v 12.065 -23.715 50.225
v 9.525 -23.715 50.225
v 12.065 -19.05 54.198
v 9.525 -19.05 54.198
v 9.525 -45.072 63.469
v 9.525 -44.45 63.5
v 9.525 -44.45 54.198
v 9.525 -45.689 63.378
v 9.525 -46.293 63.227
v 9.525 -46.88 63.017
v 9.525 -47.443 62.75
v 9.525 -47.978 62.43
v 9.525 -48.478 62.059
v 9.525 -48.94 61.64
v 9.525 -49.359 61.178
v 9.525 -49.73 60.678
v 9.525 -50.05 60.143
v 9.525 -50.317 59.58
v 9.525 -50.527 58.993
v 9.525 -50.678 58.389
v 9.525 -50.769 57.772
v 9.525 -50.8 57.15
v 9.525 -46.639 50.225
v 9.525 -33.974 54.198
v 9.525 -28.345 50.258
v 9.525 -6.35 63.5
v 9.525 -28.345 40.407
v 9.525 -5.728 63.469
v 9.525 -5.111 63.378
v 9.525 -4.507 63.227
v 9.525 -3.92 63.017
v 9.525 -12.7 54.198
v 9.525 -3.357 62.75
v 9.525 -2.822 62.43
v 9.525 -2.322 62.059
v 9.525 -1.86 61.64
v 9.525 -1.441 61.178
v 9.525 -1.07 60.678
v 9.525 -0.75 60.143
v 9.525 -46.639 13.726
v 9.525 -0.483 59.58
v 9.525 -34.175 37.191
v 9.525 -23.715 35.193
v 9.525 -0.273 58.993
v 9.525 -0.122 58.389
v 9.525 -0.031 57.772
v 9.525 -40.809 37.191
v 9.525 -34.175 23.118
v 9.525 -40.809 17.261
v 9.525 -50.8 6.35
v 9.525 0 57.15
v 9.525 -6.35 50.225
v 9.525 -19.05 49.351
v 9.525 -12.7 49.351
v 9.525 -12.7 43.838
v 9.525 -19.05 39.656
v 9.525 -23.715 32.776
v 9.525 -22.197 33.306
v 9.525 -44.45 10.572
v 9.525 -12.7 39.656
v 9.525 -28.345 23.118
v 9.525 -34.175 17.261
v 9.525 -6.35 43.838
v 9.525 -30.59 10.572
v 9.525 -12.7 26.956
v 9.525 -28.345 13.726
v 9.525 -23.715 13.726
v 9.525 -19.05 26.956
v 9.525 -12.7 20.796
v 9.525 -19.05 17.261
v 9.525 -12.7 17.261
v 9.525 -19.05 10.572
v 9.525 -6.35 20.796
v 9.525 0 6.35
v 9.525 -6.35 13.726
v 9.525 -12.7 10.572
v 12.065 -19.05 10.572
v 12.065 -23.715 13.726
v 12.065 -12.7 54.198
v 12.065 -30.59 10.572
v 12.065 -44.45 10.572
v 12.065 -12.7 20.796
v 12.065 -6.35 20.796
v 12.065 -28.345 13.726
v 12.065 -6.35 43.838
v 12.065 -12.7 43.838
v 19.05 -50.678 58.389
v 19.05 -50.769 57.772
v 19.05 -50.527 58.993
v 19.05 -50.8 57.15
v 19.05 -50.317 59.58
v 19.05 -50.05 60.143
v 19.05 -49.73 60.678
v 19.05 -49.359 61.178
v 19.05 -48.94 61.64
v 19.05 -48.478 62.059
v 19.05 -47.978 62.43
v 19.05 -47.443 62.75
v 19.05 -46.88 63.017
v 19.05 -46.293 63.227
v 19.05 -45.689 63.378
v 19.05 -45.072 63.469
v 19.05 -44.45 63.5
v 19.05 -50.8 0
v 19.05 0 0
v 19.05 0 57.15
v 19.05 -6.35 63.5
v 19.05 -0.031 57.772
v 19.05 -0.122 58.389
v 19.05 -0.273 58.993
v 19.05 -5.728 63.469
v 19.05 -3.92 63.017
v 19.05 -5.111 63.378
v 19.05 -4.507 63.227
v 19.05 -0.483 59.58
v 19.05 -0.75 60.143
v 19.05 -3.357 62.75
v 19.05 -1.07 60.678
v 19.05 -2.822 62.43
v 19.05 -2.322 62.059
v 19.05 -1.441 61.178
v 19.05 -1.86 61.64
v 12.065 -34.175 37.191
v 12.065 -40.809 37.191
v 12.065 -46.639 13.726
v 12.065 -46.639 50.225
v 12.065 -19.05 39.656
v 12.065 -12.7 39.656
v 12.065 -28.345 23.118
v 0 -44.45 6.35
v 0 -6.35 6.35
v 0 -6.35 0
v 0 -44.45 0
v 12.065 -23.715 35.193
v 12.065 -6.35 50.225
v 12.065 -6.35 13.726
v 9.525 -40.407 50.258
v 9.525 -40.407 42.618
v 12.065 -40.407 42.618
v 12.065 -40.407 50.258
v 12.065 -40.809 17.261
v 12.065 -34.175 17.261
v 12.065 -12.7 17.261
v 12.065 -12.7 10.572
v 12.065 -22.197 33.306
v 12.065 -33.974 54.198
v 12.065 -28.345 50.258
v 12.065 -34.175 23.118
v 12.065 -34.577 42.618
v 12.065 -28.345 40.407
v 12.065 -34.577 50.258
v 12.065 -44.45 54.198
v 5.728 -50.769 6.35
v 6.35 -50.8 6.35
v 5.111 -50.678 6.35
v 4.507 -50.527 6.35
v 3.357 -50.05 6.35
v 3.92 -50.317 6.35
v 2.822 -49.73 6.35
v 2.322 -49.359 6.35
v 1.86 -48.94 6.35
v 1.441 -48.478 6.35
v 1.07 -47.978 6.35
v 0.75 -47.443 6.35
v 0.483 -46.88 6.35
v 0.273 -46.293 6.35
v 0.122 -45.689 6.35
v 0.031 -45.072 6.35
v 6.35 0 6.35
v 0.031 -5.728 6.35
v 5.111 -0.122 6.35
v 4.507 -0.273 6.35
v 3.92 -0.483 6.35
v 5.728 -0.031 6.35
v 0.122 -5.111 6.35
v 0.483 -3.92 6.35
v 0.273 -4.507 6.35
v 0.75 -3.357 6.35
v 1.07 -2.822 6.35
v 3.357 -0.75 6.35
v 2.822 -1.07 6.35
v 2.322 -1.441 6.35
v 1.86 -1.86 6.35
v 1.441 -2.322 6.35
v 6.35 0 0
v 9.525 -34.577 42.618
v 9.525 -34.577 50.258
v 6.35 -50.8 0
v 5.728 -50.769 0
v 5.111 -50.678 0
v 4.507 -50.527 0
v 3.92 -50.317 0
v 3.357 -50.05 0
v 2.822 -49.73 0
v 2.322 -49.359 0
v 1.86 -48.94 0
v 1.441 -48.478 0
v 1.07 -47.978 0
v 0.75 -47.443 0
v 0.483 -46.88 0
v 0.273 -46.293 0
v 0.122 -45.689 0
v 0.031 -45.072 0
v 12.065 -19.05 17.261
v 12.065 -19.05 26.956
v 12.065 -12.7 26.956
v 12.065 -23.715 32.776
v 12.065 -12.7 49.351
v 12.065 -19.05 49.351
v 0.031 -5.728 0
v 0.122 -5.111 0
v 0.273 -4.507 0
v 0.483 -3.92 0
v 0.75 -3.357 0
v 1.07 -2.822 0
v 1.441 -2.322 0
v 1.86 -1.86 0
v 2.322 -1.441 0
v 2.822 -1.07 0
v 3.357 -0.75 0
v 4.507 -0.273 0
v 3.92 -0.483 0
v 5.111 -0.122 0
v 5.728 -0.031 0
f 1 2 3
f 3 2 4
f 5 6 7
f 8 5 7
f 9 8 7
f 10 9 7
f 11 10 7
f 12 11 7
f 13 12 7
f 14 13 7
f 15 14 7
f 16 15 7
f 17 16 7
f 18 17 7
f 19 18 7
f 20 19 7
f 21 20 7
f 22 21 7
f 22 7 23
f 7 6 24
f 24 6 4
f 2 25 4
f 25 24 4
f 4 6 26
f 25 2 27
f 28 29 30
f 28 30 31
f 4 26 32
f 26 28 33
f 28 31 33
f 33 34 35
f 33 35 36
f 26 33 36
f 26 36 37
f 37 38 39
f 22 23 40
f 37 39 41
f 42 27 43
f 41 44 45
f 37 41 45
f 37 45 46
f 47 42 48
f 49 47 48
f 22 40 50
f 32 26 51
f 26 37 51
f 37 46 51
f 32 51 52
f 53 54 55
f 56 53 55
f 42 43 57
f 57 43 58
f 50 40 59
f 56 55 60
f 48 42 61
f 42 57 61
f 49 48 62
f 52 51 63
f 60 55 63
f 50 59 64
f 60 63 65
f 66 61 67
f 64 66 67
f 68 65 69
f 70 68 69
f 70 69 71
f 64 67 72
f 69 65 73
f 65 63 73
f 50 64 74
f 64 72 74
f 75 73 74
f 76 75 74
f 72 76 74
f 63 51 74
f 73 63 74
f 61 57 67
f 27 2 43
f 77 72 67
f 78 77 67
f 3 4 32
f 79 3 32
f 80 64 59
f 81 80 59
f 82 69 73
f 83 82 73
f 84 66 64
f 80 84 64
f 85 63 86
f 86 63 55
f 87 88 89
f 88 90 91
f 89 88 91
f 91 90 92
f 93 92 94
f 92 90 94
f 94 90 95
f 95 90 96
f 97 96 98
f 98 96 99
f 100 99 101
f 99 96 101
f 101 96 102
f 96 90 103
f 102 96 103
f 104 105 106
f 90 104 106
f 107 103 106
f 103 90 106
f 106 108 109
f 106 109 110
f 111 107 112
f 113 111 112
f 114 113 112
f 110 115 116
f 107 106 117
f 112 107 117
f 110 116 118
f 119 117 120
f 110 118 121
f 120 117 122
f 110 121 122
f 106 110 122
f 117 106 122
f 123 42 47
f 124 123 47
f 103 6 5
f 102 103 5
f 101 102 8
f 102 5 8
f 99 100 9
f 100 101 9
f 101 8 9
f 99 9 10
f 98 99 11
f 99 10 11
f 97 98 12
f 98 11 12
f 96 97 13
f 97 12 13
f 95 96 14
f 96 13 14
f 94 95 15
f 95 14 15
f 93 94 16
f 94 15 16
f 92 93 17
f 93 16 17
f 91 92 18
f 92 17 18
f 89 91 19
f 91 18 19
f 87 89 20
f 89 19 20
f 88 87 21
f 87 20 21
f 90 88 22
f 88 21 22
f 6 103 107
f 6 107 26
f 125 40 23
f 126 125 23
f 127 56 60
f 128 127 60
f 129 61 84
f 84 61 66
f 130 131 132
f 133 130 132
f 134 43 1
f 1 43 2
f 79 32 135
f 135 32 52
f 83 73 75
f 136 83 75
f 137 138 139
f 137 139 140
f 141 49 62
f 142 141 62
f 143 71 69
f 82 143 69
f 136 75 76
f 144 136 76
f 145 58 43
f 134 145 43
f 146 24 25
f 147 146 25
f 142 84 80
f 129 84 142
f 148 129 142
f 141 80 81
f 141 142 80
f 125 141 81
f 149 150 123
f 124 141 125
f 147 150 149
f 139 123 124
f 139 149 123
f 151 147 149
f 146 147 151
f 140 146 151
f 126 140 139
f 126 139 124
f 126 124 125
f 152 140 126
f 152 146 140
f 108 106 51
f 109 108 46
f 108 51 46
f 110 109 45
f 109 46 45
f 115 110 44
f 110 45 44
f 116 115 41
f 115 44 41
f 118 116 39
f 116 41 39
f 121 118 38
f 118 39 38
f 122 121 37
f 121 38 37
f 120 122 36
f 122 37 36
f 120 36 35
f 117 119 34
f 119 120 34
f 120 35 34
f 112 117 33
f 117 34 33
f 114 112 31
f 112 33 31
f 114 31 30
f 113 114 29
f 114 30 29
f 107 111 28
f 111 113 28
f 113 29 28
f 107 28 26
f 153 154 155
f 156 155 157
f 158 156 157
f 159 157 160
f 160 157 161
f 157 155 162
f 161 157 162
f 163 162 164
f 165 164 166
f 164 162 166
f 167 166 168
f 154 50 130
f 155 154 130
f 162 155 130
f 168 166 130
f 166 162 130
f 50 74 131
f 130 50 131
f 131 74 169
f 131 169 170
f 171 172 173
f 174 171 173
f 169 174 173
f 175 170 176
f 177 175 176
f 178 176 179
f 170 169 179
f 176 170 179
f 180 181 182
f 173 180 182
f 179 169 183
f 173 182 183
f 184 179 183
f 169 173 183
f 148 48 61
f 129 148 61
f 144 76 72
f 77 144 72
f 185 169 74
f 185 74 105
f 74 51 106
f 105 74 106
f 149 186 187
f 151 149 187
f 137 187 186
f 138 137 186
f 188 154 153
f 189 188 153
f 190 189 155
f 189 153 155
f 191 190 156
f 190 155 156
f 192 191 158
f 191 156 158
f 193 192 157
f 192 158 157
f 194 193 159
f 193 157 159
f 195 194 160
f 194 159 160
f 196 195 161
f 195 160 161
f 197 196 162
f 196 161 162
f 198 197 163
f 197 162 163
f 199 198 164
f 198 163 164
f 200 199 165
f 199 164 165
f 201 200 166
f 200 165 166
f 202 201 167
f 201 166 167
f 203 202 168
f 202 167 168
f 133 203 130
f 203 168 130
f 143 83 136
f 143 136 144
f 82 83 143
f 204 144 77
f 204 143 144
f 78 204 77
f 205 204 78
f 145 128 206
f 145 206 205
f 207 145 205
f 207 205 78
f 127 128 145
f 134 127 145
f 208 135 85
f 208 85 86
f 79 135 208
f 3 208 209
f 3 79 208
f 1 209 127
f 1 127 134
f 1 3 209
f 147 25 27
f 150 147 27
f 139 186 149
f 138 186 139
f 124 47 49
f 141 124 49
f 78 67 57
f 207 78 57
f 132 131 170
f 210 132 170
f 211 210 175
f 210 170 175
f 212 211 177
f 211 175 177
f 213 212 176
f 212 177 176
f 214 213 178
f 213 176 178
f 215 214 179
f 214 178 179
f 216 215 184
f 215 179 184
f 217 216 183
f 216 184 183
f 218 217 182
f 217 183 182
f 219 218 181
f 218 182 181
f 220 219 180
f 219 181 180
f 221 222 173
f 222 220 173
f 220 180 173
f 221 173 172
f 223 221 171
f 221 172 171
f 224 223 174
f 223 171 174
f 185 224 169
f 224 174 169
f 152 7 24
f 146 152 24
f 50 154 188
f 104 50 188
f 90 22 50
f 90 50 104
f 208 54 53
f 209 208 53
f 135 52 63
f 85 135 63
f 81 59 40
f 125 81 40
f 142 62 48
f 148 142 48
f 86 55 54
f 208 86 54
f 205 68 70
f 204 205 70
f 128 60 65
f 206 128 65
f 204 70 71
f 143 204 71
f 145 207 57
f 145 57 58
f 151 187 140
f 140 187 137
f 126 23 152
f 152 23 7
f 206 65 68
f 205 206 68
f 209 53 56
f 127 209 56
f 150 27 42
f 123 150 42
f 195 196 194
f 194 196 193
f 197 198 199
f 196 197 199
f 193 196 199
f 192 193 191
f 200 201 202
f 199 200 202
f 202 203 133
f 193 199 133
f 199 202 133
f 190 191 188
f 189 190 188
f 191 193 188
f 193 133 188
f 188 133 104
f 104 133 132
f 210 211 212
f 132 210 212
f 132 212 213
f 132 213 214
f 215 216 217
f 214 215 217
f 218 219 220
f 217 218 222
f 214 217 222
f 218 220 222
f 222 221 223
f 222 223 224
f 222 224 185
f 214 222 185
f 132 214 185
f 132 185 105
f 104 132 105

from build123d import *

# Parameters (mm, degrees)
F1_DEPTH = 50.8
F3_DEPTH = 25.4
F5_DEPTH = 25.4
F7_DEPTH = 2.54
F8_W     = 5.829871
F8_H     = 7.639144
F9_DEPTH = 2.54


with BuildPart() as f1:
    # F0 (on Front) → F1 (new body)
    with BuildSketch(Plane.XZ):
        Polygon((0, 6.35), (0, 0), (19.05, 0), (19.05, 63.5), (9.525, 63.5), (9.525, 6.35), align=None)
    extrude(amount=F1_DEPTH)

    # F2 (on face) → F3 (cut)
    with BuildSketch(Plane.XY.offset(6.35)):
        with BuildLine():
            ThreePointArc((0, -6.35), (1.859872, -1.859872), (6.35, 0))
            Line((6.35, 0), (0, 0))
            Line((0, 0), (0, -6.35))
        make_face()
        with BuildLine():
            Line((0, -50.8), (6.35, -50.8))
            ThreePointArc((6.35, -50.8), (1.859872, -48.940128), (0, -44.45))
            Line((0, -44.45), (0, -50.8))
        make_face()
    extrude(amount=-F3_DEPTH, mode=Mode.SUBTRACT)

    # F4 (on face) → F5 (cut)
    with BuildSketch(Plane(origin=(9.525, 0, 0), x_dir=(0, -1, 0), z_dir=(-1, 0, 0))):
        with BuildLine():
            ThreePointArc((0, 57.15), (1.859872, 61.640128), (6.35, 63.5))
            Line((6.35, 63.5), (0, 63.5))
            Line((0, 63.5), (0, 57.15))
        make_face()
        with BuildLine():
            ThreePointArc((44.45, 63.5), (48.940128, 61.640128), (50.8, 57.15))
            Line((50.8, 57.15), (50.8, 63.5))
            Line((50.8, 63.5), (44.45, 63.5))
        make_face()
    extrude(amount=-F5_DEPTH, mode=Mode.SUBTRACT)

    # F6 (on face) → F7 (cut)
    with BuildSketch(Plane(origin=(9.525, 0, 0), x_dir=(0, -1, 0), z_dir=(-1, 0, 0))):
        Polygon((6.35, 50.224786), (6.35, 43.83772), (12.7, 43.83772), (12.7, 49.350649), (19.05, 49.350649), (19.05, 39.655992), (12.7, 39.655992), (12.7, 26.955992), (19.05, 26.955992), (19.05, 17.261336), (12.7, 17.261336), (12.7, 20.796465), (6.35, 20.796465), (6.35, 13.726207), (12.7, 10.572023), (19.05, 10.572023), (23.714906, 13.726207), (23.714906, 32.776207), (22.196746, 33.305992), (23.714906, 35.193134), (23.714906, 50.224786), (19.05, 54.197977), (12.7, 54.197977), align=None)
    extrude(amount=-F7_DEPTH, mode=Mode.SUBTRACT)

    # F8 (on face) → F9 (cut)
    with BuildSketch(Plane(origin=(9.525, 0, 0), x_dir=(0, -1, 0), z_dir=(-1, 0, 0))):
        Polygon((28.345251, 40.407062), (34.175124, 37.190579), (40.809121, 37.190579), (40.809121, 17.261336), (34.175124, 17.261336), (34.175124, 23.118468), (28.345251, 23.118468), (28.345251, 13.726207), (30.590052, 10.572023), (44.45, 10.572023), (46.638995, 13.726207), (46.638995, 50.224786), (44.45, 54.197977), (33.974096, 54.197977), (28.345251, 50.257538), align=None)
        with Locations((37.492122, 46.437966)):
            Rectangle(F8_W, F8_H, mode=Mode.SUBTRACT)
    extrude(amount=-F9_DEPTH, mode=Mode.SUBTRACT)


solid = f1.part
